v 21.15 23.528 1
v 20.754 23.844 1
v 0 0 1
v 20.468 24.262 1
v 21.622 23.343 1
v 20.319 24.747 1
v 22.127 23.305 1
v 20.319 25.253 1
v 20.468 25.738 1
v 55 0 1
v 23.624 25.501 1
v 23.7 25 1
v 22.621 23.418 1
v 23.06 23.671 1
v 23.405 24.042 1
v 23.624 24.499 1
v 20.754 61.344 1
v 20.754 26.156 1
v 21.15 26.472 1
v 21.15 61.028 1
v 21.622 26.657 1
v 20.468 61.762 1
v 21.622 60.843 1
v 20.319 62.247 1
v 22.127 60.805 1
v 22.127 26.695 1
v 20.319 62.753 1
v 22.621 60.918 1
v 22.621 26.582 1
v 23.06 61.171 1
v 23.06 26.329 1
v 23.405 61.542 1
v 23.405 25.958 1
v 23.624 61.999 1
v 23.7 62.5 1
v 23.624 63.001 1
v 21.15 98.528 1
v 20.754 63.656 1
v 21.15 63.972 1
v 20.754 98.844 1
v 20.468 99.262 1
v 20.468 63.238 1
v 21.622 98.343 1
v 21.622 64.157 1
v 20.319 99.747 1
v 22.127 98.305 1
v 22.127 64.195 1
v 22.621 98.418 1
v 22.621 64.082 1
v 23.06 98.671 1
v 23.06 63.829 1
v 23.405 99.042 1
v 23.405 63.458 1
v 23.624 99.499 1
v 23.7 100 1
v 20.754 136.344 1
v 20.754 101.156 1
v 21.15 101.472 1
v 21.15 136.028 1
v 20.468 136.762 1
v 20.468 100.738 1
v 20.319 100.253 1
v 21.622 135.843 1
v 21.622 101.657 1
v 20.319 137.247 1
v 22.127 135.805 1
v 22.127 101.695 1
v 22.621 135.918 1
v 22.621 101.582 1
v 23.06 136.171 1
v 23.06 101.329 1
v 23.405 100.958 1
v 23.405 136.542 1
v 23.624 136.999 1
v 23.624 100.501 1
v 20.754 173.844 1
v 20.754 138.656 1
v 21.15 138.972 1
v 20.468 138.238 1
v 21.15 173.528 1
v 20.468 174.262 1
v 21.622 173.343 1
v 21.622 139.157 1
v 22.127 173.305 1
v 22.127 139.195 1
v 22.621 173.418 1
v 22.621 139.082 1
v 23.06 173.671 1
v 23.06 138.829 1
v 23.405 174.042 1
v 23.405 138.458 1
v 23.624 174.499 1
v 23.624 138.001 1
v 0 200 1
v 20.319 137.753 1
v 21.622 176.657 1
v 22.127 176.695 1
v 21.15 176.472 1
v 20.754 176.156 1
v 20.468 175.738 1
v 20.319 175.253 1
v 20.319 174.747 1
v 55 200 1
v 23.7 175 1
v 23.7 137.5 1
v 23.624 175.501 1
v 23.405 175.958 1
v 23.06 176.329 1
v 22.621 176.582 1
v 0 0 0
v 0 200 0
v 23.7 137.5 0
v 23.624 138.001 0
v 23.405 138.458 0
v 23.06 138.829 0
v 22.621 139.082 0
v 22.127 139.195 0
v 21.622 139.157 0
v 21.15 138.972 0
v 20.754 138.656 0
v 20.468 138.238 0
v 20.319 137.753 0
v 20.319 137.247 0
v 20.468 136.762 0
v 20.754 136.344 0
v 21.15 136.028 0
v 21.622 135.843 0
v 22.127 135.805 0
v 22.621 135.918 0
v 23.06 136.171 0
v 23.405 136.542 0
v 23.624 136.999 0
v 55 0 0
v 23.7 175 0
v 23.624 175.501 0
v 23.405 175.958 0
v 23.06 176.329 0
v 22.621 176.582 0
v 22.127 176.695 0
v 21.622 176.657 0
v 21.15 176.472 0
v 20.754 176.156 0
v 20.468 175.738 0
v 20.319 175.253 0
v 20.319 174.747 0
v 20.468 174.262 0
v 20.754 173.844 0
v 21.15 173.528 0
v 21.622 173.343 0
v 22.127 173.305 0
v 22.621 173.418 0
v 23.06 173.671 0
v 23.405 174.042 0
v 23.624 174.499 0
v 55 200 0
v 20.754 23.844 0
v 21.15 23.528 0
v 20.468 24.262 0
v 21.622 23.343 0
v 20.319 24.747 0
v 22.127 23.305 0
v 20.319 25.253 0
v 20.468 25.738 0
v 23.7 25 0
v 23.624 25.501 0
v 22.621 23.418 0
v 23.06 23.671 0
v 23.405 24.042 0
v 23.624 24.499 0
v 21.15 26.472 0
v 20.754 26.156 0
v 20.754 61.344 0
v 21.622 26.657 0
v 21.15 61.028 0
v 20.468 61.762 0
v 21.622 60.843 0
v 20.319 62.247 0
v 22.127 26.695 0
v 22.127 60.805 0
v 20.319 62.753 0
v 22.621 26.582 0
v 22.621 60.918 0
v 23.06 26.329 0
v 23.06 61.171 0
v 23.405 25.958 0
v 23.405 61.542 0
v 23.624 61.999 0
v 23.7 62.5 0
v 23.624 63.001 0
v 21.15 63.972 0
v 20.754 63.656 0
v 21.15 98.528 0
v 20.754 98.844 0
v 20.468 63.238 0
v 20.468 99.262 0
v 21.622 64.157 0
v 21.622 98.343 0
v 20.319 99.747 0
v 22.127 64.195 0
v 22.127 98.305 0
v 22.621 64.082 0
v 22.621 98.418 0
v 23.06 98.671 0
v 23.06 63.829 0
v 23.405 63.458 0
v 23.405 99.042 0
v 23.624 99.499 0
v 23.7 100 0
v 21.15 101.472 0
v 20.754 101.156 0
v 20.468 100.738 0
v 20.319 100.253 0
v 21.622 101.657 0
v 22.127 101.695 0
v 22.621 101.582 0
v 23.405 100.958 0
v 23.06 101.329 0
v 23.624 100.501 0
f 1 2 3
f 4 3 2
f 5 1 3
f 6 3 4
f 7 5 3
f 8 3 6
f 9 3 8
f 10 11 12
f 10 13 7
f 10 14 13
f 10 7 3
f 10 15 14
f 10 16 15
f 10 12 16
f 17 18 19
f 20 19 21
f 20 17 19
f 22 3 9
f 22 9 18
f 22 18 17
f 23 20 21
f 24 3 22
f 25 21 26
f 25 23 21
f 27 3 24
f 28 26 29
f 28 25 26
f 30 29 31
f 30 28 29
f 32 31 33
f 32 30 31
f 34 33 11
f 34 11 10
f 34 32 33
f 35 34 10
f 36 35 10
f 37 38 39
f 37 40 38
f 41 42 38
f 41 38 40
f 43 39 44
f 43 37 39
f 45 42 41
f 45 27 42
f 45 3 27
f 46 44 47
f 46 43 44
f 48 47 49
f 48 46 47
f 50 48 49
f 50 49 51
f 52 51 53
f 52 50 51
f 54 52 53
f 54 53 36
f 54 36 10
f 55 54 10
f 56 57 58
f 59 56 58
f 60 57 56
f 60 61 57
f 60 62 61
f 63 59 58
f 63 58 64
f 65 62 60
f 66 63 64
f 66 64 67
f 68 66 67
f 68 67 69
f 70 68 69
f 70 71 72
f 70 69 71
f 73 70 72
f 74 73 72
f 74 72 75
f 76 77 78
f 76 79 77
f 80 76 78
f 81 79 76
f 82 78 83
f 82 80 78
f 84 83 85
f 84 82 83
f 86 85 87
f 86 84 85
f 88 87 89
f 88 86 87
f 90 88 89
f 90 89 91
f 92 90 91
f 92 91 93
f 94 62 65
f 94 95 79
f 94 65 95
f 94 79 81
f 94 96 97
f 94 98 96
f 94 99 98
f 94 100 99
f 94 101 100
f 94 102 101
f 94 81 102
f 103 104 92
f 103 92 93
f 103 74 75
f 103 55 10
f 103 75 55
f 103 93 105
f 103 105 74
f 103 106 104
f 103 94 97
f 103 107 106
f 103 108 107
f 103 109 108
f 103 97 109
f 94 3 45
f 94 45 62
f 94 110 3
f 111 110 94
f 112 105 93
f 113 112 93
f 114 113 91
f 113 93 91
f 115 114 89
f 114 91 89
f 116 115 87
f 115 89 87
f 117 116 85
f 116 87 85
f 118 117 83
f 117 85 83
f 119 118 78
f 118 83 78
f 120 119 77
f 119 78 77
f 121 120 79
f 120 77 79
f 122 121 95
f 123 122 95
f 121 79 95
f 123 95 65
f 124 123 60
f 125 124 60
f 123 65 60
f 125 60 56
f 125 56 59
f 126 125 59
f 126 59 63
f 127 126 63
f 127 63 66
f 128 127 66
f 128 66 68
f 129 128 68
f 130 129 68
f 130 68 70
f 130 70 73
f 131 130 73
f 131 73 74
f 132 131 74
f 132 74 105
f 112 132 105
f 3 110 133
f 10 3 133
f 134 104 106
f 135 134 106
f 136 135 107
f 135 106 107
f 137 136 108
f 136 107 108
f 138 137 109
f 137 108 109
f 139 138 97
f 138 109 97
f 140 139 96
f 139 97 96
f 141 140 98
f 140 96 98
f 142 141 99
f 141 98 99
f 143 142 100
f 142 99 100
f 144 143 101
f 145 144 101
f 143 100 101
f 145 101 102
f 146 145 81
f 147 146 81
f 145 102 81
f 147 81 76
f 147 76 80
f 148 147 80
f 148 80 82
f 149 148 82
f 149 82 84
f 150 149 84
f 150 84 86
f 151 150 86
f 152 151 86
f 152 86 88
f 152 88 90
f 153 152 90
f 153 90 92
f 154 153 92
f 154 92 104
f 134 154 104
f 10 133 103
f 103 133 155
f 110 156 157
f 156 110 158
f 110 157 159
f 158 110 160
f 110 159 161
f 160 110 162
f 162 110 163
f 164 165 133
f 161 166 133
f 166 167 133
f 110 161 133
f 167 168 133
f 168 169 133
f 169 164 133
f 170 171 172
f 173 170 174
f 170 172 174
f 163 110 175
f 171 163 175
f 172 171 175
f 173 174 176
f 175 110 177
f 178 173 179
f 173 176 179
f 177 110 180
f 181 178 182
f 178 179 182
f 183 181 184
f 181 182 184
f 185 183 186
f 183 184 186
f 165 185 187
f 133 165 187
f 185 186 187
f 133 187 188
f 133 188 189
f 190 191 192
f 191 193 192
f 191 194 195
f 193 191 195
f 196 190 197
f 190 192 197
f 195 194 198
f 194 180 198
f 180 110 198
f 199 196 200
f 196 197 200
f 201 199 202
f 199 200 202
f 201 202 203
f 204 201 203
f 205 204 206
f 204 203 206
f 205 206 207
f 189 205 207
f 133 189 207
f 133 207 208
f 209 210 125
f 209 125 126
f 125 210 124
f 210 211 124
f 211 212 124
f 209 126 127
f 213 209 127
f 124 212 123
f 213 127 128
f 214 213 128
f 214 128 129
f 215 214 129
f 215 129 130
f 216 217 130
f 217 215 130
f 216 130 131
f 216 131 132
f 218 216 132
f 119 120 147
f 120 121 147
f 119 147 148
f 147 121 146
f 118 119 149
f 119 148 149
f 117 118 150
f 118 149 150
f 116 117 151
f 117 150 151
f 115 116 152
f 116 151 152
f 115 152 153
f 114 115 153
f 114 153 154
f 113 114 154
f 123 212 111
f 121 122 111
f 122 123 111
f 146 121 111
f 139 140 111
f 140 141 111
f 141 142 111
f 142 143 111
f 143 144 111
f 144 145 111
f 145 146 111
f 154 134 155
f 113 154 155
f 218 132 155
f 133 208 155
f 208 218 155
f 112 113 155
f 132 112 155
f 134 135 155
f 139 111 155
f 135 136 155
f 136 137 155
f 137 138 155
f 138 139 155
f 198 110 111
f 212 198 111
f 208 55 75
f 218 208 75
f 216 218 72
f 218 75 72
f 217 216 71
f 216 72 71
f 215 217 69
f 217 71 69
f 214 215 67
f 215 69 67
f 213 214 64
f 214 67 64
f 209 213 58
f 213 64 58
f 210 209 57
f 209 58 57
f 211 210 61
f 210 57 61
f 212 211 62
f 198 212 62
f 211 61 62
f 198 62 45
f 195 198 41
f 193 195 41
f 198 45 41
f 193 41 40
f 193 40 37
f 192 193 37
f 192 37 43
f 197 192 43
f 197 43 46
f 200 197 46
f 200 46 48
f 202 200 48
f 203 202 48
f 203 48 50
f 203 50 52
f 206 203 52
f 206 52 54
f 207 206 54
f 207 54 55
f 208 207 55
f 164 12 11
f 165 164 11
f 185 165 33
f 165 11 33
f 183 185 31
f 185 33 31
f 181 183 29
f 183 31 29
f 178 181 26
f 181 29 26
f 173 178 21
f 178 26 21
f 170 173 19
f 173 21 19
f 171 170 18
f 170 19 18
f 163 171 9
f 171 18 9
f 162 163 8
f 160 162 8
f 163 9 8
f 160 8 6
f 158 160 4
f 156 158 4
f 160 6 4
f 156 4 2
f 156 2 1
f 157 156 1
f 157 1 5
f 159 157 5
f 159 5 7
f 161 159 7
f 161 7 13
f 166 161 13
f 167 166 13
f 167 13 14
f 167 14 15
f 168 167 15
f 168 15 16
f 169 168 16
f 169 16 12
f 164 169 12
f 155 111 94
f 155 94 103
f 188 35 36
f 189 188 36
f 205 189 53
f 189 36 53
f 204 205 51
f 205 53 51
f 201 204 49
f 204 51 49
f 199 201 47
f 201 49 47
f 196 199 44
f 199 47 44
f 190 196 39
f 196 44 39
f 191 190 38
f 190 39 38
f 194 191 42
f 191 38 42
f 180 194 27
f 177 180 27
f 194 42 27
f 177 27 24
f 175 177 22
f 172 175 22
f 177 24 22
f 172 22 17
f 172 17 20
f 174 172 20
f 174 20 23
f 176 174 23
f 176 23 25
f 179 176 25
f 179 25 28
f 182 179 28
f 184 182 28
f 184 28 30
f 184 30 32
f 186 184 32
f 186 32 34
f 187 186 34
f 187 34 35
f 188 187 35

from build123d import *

# Parameters (mm, degrees)
SKETCH_1_W            = 55
SKETCH_1_H            = 200
EXTRUDE_1_DEPTH       = 1
HOLE_WIZARD_M31_D     = 3.4
HOLE_WIZARD_M31_DEPTH = 5
HOLE_WIZARD_M31_TIP   = 1.021463052


with BuildPart() as part:
    # Эскиз1 → Бобышка-Вытянуть1 (new body)
    with BuildSketch(Plane.XY):
        with Locations((27.5, 100)):
            Rectangle(SKETCH_1_W, SKETCH_1_H)
    extrude(amount=EXTRUDE_1_DEPTH)

    # Отверстие с зазором M31
    with Locations(Plane(origin=(0, 0, 0), x_dir=(-1, 0, 0), z_dir=(0, 0, -1))):
        with Locations((-22, 175), (-22, 137.5), (-22, 100), (-22, 62.5), (-22, 25)):
            Hole(HOLE_WIZARD_M31_D / 2, depth=HOLE_WIZARD_M31_DEPTH)
            with Locations((0, 0, -(HOLE_WIZARD_M31_DEPTH + HOLE_WIZARD_M31_TIP / 2))):  # 118° drill point
                Cone(0, HOLE_WIZARD_M31_D / 2, HOLE_WIZARD_M31_TIP, mode=Mode.SUBTRACT)


solid = part.part
